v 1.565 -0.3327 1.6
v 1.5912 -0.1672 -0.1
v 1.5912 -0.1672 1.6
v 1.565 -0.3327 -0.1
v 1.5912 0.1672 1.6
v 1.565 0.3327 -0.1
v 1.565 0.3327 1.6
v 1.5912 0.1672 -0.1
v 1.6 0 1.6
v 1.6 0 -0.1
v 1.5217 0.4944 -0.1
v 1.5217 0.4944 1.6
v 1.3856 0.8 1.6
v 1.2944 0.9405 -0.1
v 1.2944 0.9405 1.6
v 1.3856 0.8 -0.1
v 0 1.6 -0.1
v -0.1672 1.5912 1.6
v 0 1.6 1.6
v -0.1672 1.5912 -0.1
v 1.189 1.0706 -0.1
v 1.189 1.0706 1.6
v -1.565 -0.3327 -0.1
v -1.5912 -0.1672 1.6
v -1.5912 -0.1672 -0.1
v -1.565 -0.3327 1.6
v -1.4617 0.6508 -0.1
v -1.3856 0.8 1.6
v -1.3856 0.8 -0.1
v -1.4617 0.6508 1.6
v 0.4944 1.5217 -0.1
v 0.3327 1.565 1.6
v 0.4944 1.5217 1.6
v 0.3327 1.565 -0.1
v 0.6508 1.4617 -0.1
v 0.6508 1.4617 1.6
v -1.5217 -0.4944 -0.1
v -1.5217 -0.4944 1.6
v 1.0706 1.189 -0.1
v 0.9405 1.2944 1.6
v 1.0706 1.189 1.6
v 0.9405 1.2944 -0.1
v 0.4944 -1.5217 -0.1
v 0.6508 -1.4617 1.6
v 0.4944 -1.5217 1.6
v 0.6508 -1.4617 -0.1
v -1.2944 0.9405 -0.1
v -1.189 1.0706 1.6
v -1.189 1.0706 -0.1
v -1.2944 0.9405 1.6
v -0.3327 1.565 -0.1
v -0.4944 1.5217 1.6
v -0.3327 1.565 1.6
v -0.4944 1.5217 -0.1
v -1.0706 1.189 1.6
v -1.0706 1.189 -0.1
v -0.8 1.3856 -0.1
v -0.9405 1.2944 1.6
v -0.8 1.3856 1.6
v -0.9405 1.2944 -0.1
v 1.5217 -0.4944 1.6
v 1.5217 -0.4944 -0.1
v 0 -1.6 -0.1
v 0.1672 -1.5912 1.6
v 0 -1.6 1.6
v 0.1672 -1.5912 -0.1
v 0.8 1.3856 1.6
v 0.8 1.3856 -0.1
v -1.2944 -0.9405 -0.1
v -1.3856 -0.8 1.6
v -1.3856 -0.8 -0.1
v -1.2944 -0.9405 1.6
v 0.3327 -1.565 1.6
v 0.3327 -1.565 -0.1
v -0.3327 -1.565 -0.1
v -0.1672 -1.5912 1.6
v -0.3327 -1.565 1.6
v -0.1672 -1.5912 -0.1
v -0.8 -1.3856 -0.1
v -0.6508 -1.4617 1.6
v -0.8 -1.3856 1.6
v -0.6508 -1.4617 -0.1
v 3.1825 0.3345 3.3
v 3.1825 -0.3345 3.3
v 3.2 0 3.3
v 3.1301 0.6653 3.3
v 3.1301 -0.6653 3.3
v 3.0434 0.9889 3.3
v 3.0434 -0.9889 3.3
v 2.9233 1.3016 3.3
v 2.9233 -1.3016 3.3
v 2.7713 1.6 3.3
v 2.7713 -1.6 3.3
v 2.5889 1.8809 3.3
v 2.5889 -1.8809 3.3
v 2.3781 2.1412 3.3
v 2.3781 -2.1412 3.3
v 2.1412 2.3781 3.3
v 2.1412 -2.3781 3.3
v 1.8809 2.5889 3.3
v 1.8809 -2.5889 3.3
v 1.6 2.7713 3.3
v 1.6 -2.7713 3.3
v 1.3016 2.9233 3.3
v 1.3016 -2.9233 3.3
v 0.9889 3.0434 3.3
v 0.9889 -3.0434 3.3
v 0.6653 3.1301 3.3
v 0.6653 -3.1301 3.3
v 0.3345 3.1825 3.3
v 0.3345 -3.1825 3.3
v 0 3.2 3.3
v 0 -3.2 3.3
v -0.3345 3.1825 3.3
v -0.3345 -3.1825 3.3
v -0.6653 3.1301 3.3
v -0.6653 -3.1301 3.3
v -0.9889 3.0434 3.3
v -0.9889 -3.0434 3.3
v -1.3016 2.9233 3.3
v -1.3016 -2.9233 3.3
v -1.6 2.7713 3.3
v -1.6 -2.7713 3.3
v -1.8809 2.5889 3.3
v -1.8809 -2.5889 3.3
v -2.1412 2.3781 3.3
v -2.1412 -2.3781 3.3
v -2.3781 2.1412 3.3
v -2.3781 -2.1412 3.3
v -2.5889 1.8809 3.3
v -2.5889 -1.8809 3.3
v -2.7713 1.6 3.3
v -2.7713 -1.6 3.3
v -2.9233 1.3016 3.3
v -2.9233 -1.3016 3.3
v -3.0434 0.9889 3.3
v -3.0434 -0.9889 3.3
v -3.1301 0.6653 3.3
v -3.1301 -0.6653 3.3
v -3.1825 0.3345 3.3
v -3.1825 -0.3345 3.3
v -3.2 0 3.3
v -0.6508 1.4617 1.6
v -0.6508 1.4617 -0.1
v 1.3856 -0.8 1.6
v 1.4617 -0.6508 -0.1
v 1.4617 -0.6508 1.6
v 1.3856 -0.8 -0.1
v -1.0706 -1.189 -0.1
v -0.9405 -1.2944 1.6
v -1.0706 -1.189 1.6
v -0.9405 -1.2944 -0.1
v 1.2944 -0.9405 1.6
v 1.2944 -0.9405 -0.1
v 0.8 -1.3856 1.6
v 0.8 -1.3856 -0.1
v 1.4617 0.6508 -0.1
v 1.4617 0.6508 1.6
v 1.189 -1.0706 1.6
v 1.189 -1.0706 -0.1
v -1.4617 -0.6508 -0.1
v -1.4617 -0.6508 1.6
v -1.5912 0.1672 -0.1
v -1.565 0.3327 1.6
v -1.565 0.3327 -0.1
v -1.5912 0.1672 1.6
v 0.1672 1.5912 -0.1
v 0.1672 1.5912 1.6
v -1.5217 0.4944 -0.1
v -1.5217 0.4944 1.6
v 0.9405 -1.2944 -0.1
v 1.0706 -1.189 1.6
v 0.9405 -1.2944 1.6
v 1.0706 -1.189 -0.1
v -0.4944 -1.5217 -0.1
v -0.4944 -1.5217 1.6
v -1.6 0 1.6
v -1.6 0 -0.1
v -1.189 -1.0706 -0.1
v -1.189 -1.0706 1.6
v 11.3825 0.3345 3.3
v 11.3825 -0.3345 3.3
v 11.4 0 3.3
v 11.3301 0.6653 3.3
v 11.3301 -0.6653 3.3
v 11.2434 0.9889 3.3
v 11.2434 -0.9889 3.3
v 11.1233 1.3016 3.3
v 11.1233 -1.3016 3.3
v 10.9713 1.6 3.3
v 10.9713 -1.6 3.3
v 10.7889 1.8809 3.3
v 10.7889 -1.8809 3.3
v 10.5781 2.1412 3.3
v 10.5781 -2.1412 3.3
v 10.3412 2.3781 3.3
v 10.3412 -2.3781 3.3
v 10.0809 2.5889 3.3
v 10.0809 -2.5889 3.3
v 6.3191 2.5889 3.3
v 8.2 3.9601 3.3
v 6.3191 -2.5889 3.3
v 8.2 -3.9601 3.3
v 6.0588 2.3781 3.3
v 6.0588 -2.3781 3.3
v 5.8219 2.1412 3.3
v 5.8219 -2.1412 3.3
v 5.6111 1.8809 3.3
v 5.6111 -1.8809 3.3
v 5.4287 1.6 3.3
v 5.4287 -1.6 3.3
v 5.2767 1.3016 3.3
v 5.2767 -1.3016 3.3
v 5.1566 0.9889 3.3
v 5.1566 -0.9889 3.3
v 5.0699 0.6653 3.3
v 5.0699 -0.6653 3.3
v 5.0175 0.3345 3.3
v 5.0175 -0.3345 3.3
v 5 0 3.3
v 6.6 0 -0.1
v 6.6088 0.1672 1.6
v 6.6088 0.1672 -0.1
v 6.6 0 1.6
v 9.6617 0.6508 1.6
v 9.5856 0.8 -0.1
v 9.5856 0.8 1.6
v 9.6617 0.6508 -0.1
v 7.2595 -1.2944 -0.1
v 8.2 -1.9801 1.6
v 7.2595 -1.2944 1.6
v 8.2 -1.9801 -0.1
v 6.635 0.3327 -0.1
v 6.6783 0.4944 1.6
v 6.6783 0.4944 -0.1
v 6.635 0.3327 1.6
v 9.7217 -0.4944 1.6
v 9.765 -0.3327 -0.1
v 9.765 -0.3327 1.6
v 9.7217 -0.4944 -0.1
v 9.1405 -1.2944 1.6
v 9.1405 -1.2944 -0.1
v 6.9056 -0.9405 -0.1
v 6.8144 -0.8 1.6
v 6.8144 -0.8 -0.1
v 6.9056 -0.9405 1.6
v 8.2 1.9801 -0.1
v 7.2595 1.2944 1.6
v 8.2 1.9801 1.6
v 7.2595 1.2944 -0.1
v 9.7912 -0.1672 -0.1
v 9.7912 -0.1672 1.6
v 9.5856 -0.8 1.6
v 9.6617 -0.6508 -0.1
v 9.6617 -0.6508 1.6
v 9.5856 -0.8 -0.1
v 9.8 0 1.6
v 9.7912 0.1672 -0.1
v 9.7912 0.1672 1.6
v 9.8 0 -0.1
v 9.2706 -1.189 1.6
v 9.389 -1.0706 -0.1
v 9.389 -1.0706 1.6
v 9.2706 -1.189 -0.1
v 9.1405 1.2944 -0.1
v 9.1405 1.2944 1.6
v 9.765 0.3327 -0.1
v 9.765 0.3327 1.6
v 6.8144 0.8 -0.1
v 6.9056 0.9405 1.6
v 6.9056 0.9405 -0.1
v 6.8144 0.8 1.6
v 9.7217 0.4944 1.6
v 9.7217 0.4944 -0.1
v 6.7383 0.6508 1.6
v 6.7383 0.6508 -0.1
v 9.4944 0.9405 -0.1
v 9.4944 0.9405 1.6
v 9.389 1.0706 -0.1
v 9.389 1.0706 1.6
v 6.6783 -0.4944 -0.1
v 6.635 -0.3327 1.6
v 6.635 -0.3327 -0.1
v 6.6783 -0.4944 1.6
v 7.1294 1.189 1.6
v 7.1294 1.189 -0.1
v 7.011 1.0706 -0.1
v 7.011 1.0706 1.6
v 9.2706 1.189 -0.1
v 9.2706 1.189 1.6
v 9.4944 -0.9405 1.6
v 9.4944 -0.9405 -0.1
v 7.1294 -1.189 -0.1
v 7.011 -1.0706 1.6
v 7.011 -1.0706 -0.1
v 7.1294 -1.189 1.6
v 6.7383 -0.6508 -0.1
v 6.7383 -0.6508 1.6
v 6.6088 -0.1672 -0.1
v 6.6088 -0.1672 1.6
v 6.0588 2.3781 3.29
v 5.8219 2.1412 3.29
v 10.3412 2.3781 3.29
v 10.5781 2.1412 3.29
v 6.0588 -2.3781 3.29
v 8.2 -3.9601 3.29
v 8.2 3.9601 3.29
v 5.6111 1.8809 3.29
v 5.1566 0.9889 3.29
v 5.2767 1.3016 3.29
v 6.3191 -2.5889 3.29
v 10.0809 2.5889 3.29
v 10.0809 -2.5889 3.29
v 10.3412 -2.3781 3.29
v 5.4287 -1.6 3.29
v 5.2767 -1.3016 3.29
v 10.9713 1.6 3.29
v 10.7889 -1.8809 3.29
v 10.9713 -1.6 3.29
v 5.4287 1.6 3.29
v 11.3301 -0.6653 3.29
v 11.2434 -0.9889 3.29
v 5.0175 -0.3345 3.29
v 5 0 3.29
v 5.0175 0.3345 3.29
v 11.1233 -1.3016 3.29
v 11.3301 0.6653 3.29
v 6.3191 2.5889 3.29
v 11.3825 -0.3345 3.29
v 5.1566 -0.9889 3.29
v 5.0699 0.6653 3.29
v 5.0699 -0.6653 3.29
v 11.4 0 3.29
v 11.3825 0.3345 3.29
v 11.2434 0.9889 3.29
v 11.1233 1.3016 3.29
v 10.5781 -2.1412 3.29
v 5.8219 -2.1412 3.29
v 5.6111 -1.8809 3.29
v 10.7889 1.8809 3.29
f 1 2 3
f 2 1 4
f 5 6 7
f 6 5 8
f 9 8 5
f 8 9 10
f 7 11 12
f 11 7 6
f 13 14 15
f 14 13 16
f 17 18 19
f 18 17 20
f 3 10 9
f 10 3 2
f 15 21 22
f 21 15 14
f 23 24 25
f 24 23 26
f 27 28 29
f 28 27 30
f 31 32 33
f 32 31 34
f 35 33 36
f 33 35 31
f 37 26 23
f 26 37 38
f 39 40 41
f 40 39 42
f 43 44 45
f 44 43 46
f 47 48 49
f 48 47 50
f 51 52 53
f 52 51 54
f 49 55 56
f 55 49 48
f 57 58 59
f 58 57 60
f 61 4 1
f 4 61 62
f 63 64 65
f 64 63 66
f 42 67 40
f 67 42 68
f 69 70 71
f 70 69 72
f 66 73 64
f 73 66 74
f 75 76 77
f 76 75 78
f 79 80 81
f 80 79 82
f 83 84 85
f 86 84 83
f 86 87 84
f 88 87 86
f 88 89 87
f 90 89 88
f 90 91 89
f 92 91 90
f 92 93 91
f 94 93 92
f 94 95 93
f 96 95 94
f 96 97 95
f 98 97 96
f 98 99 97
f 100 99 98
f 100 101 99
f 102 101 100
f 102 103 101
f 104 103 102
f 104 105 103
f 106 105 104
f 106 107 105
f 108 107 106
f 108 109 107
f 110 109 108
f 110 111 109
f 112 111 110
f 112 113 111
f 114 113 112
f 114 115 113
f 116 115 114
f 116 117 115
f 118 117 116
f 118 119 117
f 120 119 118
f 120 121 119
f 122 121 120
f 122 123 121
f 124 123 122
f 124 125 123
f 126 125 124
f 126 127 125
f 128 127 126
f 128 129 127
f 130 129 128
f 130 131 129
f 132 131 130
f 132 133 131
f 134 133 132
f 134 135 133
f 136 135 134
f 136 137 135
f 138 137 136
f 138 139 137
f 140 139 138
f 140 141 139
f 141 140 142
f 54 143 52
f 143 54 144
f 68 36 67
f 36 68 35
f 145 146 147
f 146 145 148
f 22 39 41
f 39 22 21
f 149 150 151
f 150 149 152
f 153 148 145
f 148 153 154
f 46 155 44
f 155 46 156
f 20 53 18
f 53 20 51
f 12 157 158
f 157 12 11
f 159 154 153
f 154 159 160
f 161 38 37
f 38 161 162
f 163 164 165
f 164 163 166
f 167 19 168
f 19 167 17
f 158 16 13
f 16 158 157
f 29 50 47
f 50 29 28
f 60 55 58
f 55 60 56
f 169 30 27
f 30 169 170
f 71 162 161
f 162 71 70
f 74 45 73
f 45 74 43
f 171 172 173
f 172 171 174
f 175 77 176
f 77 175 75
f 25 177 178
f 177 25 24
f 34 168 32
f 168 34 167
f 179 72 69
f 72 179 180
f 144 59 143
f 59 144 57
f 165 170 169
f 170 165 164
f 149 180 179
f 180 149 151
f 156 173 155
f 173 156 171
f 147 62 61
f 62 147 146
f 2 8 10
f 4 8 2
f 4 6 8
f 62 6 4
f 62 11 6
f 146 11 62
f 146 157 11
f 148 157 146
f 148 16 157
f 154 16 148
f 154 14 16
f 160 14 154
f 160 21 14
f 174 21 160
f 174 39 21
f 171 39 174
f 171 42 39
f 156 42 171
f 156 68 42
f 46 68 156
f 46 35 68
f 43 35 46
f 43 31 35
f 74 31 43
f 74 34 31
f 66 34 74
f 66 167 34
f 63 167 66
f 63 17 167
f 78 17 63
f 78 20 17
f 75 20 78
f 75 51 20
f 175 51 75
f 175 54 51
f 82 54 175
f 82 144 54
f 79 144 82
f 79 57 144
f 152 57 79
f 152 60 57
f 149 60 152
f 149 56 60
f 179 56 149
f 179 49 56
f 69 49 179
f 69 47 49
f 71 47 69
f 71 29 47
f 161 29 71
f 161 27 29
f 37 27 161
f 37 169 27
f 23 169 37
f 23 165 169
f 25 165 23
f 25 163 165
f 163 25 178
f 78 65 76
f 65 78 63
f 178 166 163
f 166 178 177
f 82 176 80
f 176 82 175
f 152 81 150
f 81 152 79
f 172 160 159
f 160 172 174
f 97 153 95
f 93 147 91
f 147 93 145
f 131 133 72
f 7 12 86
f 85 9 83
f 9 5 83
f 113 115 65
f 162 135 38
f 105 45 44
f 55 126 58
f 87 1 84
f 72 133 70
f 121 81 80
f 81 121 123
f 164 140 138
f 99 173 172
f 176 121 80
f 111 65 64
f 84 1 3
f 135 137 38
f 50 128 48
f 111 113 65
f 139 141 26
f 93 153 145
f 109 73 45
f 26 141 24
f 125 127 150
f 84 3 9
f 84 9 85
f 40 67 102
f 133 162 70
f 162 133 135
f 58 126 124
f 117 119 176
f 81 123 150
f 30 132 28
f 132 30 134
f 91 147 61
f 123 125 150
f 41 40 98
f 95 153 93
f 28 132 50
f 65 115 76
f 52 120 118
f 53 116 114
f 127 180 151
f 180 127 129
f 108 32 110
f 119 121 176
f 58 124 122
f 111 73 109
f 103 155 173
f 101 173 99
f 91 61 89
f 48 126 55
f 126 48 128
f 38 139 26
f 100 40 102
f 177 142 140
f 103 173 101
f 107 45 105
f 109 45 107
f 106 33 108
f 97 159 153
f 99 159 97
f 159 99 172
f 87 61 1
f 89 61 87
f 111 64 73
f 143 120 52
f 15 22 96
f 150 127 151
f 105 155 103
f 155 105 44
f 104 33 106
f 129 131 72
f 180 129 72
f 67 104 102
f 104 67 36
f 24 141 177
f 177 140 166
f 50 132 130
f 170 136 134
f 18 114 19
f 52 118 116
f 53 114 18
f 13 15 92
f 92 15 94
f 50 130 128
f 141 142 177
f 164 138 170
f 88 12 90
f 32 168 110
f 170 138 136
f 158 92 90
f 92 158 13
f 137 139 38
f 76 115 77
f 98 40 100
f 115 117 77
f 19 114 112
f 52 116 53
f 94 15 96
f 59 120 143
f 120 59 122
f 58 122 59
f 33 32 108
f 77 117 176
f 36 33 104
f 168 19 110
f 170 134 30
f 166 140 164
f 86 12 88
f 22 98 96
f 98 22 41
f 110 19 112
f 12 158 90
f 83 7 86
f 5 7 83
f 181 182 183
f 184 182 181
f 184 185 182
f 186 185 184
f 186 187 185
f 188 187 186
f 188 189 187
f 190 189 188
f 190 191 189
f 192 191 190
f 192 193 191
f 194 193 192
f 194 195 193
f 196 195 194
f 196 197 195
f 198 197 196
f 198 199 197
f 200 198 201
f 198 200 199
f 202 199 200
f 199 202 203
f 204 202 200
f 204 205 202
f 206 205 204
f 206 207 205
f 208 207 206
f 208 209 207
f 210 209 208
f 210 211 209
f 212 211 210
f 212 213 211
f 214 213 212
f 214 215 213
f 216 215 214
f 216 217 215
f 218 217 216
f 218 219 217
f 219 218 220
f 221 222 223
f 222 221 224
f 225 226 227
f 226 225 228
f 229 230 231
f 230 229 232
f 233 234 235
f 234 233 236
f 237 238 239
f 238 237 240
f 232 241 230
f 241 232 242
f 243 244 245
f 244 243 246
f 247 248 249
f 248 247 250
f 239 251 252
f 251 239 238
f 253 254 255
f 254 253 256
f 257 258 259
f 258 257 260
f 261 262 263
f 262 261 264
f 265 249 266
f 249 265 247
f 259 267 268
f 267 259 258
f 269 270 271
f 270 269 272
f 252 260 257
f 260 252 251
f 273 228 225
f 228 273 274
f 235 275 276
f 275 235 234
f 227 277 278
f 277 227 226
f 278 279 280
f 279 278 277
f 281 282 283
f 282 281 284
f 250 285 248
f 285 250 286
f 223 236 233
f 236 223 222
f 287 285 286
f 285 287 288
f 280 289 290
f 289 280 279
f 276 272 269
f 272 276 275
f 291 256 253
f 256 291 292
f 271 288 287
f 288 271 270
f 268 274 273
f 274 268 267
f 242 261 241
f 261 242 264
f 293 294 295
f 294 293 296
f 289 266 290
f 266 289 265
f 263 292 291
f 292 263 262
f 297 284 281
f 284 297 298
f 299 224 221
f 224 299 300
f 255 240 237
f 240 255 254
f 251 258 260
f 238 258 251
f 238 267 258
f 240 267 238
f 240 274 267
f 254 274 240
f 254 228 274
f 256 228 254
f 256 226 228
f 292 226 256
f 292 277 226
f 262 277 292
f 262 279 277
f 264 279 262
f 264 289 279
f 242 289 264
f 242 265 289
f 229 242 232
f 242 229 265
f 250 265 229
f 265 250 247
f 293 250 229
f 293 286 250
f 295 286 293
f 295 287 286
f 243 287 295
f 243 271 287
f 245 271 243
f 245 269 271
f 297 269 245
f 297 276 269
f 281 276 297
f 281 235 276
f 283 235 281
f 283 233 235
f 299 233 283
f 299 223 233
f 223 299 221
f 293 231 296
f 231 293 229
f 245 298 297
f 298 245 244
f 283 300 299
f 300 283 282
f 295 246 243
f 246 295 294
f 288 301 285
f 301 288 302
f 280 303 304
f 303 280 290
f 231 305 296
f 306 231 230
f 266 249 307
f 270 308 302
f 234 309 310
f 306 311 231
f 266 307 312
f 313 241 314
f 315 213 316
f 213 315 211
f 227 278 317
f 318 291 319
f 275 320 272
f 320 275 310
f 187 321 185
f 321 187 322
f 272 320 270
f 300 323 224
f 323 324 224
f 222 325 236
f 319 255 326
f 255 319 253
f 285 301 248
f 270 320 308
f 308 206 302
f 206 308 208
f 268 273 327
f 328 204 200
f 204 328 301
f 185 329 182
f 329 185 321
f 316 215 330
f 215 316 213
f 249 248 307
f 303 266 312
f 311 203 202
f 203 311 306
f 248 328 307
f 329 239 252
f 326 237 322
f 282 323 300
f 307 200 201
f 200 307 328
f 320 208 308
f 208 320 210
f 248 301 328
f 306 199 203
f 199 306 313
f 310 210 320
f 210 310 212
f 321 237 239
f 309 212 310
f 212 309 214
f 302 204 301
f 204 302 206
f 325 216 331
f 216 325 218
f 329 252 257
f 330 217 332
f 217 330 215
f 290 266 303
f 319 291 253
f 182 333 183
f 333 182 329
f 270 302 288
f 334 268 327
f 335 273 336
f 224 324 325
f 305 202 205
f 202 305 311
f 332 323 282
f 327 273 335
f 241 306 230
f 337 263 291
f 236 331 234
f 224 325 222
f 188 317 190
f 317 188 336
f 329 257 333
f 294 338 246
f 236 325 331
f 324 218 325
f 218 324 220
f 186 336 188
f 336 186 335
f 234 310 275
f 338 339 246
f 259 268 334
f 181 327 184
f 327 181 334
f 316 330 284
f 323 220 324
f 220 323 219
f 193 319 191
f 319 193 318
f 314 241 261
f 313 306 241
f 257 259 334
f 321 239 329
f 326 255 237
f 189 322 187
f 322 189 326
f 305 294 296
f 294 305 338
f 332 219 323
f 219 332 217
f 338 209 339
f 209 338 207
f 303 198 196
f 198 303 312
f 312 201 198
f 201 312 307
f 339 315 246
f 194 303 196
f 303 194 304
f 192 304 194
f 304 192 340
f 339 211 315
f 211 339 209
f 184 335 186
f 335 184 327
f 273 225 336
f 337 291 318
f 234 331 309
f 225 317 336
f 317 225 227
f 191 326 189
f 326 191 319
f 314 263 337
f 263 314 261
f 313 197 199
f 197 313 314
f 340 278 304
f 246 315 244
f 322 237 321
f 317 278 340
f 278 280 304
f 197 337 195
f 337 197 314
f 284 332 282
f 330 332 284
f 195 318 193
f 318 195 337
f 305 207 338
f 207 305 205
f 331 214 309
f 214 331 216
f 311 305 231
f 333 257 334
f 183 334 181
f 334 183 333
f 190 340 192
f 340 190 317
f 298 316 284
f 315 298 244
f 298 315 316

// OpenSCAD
include <../scad/parameters.scad>

use <../scad/lib/functions.scad>
use <../scad/lib/slots.scad>

hole_d  = m3_hole_dia;
bore_d  = hole_d * 2;
angle   = 90;

bore_h  = countersink_h(d=hole_d, sink_d=bore_d, angle=angle);

spacing = 5;

union() {
  counterbore(d=hole_d,
              h=bore_h * 2,
              bore_h=bore_h,
              bore_d=bore_d,
              sink=true,
              print_sink_angle=true);

  translate([hole_d + spacing, 0, 0]) {
    counterbore(d=hole_d,
                h=bore_h * 2,
                bore_h=bore_h,
                bore_d=bore_d,
                teardrop_angle=44,
                teardrop_both_sides=true,
                sink=true,
                print_sink_angle=true);
  }
}
